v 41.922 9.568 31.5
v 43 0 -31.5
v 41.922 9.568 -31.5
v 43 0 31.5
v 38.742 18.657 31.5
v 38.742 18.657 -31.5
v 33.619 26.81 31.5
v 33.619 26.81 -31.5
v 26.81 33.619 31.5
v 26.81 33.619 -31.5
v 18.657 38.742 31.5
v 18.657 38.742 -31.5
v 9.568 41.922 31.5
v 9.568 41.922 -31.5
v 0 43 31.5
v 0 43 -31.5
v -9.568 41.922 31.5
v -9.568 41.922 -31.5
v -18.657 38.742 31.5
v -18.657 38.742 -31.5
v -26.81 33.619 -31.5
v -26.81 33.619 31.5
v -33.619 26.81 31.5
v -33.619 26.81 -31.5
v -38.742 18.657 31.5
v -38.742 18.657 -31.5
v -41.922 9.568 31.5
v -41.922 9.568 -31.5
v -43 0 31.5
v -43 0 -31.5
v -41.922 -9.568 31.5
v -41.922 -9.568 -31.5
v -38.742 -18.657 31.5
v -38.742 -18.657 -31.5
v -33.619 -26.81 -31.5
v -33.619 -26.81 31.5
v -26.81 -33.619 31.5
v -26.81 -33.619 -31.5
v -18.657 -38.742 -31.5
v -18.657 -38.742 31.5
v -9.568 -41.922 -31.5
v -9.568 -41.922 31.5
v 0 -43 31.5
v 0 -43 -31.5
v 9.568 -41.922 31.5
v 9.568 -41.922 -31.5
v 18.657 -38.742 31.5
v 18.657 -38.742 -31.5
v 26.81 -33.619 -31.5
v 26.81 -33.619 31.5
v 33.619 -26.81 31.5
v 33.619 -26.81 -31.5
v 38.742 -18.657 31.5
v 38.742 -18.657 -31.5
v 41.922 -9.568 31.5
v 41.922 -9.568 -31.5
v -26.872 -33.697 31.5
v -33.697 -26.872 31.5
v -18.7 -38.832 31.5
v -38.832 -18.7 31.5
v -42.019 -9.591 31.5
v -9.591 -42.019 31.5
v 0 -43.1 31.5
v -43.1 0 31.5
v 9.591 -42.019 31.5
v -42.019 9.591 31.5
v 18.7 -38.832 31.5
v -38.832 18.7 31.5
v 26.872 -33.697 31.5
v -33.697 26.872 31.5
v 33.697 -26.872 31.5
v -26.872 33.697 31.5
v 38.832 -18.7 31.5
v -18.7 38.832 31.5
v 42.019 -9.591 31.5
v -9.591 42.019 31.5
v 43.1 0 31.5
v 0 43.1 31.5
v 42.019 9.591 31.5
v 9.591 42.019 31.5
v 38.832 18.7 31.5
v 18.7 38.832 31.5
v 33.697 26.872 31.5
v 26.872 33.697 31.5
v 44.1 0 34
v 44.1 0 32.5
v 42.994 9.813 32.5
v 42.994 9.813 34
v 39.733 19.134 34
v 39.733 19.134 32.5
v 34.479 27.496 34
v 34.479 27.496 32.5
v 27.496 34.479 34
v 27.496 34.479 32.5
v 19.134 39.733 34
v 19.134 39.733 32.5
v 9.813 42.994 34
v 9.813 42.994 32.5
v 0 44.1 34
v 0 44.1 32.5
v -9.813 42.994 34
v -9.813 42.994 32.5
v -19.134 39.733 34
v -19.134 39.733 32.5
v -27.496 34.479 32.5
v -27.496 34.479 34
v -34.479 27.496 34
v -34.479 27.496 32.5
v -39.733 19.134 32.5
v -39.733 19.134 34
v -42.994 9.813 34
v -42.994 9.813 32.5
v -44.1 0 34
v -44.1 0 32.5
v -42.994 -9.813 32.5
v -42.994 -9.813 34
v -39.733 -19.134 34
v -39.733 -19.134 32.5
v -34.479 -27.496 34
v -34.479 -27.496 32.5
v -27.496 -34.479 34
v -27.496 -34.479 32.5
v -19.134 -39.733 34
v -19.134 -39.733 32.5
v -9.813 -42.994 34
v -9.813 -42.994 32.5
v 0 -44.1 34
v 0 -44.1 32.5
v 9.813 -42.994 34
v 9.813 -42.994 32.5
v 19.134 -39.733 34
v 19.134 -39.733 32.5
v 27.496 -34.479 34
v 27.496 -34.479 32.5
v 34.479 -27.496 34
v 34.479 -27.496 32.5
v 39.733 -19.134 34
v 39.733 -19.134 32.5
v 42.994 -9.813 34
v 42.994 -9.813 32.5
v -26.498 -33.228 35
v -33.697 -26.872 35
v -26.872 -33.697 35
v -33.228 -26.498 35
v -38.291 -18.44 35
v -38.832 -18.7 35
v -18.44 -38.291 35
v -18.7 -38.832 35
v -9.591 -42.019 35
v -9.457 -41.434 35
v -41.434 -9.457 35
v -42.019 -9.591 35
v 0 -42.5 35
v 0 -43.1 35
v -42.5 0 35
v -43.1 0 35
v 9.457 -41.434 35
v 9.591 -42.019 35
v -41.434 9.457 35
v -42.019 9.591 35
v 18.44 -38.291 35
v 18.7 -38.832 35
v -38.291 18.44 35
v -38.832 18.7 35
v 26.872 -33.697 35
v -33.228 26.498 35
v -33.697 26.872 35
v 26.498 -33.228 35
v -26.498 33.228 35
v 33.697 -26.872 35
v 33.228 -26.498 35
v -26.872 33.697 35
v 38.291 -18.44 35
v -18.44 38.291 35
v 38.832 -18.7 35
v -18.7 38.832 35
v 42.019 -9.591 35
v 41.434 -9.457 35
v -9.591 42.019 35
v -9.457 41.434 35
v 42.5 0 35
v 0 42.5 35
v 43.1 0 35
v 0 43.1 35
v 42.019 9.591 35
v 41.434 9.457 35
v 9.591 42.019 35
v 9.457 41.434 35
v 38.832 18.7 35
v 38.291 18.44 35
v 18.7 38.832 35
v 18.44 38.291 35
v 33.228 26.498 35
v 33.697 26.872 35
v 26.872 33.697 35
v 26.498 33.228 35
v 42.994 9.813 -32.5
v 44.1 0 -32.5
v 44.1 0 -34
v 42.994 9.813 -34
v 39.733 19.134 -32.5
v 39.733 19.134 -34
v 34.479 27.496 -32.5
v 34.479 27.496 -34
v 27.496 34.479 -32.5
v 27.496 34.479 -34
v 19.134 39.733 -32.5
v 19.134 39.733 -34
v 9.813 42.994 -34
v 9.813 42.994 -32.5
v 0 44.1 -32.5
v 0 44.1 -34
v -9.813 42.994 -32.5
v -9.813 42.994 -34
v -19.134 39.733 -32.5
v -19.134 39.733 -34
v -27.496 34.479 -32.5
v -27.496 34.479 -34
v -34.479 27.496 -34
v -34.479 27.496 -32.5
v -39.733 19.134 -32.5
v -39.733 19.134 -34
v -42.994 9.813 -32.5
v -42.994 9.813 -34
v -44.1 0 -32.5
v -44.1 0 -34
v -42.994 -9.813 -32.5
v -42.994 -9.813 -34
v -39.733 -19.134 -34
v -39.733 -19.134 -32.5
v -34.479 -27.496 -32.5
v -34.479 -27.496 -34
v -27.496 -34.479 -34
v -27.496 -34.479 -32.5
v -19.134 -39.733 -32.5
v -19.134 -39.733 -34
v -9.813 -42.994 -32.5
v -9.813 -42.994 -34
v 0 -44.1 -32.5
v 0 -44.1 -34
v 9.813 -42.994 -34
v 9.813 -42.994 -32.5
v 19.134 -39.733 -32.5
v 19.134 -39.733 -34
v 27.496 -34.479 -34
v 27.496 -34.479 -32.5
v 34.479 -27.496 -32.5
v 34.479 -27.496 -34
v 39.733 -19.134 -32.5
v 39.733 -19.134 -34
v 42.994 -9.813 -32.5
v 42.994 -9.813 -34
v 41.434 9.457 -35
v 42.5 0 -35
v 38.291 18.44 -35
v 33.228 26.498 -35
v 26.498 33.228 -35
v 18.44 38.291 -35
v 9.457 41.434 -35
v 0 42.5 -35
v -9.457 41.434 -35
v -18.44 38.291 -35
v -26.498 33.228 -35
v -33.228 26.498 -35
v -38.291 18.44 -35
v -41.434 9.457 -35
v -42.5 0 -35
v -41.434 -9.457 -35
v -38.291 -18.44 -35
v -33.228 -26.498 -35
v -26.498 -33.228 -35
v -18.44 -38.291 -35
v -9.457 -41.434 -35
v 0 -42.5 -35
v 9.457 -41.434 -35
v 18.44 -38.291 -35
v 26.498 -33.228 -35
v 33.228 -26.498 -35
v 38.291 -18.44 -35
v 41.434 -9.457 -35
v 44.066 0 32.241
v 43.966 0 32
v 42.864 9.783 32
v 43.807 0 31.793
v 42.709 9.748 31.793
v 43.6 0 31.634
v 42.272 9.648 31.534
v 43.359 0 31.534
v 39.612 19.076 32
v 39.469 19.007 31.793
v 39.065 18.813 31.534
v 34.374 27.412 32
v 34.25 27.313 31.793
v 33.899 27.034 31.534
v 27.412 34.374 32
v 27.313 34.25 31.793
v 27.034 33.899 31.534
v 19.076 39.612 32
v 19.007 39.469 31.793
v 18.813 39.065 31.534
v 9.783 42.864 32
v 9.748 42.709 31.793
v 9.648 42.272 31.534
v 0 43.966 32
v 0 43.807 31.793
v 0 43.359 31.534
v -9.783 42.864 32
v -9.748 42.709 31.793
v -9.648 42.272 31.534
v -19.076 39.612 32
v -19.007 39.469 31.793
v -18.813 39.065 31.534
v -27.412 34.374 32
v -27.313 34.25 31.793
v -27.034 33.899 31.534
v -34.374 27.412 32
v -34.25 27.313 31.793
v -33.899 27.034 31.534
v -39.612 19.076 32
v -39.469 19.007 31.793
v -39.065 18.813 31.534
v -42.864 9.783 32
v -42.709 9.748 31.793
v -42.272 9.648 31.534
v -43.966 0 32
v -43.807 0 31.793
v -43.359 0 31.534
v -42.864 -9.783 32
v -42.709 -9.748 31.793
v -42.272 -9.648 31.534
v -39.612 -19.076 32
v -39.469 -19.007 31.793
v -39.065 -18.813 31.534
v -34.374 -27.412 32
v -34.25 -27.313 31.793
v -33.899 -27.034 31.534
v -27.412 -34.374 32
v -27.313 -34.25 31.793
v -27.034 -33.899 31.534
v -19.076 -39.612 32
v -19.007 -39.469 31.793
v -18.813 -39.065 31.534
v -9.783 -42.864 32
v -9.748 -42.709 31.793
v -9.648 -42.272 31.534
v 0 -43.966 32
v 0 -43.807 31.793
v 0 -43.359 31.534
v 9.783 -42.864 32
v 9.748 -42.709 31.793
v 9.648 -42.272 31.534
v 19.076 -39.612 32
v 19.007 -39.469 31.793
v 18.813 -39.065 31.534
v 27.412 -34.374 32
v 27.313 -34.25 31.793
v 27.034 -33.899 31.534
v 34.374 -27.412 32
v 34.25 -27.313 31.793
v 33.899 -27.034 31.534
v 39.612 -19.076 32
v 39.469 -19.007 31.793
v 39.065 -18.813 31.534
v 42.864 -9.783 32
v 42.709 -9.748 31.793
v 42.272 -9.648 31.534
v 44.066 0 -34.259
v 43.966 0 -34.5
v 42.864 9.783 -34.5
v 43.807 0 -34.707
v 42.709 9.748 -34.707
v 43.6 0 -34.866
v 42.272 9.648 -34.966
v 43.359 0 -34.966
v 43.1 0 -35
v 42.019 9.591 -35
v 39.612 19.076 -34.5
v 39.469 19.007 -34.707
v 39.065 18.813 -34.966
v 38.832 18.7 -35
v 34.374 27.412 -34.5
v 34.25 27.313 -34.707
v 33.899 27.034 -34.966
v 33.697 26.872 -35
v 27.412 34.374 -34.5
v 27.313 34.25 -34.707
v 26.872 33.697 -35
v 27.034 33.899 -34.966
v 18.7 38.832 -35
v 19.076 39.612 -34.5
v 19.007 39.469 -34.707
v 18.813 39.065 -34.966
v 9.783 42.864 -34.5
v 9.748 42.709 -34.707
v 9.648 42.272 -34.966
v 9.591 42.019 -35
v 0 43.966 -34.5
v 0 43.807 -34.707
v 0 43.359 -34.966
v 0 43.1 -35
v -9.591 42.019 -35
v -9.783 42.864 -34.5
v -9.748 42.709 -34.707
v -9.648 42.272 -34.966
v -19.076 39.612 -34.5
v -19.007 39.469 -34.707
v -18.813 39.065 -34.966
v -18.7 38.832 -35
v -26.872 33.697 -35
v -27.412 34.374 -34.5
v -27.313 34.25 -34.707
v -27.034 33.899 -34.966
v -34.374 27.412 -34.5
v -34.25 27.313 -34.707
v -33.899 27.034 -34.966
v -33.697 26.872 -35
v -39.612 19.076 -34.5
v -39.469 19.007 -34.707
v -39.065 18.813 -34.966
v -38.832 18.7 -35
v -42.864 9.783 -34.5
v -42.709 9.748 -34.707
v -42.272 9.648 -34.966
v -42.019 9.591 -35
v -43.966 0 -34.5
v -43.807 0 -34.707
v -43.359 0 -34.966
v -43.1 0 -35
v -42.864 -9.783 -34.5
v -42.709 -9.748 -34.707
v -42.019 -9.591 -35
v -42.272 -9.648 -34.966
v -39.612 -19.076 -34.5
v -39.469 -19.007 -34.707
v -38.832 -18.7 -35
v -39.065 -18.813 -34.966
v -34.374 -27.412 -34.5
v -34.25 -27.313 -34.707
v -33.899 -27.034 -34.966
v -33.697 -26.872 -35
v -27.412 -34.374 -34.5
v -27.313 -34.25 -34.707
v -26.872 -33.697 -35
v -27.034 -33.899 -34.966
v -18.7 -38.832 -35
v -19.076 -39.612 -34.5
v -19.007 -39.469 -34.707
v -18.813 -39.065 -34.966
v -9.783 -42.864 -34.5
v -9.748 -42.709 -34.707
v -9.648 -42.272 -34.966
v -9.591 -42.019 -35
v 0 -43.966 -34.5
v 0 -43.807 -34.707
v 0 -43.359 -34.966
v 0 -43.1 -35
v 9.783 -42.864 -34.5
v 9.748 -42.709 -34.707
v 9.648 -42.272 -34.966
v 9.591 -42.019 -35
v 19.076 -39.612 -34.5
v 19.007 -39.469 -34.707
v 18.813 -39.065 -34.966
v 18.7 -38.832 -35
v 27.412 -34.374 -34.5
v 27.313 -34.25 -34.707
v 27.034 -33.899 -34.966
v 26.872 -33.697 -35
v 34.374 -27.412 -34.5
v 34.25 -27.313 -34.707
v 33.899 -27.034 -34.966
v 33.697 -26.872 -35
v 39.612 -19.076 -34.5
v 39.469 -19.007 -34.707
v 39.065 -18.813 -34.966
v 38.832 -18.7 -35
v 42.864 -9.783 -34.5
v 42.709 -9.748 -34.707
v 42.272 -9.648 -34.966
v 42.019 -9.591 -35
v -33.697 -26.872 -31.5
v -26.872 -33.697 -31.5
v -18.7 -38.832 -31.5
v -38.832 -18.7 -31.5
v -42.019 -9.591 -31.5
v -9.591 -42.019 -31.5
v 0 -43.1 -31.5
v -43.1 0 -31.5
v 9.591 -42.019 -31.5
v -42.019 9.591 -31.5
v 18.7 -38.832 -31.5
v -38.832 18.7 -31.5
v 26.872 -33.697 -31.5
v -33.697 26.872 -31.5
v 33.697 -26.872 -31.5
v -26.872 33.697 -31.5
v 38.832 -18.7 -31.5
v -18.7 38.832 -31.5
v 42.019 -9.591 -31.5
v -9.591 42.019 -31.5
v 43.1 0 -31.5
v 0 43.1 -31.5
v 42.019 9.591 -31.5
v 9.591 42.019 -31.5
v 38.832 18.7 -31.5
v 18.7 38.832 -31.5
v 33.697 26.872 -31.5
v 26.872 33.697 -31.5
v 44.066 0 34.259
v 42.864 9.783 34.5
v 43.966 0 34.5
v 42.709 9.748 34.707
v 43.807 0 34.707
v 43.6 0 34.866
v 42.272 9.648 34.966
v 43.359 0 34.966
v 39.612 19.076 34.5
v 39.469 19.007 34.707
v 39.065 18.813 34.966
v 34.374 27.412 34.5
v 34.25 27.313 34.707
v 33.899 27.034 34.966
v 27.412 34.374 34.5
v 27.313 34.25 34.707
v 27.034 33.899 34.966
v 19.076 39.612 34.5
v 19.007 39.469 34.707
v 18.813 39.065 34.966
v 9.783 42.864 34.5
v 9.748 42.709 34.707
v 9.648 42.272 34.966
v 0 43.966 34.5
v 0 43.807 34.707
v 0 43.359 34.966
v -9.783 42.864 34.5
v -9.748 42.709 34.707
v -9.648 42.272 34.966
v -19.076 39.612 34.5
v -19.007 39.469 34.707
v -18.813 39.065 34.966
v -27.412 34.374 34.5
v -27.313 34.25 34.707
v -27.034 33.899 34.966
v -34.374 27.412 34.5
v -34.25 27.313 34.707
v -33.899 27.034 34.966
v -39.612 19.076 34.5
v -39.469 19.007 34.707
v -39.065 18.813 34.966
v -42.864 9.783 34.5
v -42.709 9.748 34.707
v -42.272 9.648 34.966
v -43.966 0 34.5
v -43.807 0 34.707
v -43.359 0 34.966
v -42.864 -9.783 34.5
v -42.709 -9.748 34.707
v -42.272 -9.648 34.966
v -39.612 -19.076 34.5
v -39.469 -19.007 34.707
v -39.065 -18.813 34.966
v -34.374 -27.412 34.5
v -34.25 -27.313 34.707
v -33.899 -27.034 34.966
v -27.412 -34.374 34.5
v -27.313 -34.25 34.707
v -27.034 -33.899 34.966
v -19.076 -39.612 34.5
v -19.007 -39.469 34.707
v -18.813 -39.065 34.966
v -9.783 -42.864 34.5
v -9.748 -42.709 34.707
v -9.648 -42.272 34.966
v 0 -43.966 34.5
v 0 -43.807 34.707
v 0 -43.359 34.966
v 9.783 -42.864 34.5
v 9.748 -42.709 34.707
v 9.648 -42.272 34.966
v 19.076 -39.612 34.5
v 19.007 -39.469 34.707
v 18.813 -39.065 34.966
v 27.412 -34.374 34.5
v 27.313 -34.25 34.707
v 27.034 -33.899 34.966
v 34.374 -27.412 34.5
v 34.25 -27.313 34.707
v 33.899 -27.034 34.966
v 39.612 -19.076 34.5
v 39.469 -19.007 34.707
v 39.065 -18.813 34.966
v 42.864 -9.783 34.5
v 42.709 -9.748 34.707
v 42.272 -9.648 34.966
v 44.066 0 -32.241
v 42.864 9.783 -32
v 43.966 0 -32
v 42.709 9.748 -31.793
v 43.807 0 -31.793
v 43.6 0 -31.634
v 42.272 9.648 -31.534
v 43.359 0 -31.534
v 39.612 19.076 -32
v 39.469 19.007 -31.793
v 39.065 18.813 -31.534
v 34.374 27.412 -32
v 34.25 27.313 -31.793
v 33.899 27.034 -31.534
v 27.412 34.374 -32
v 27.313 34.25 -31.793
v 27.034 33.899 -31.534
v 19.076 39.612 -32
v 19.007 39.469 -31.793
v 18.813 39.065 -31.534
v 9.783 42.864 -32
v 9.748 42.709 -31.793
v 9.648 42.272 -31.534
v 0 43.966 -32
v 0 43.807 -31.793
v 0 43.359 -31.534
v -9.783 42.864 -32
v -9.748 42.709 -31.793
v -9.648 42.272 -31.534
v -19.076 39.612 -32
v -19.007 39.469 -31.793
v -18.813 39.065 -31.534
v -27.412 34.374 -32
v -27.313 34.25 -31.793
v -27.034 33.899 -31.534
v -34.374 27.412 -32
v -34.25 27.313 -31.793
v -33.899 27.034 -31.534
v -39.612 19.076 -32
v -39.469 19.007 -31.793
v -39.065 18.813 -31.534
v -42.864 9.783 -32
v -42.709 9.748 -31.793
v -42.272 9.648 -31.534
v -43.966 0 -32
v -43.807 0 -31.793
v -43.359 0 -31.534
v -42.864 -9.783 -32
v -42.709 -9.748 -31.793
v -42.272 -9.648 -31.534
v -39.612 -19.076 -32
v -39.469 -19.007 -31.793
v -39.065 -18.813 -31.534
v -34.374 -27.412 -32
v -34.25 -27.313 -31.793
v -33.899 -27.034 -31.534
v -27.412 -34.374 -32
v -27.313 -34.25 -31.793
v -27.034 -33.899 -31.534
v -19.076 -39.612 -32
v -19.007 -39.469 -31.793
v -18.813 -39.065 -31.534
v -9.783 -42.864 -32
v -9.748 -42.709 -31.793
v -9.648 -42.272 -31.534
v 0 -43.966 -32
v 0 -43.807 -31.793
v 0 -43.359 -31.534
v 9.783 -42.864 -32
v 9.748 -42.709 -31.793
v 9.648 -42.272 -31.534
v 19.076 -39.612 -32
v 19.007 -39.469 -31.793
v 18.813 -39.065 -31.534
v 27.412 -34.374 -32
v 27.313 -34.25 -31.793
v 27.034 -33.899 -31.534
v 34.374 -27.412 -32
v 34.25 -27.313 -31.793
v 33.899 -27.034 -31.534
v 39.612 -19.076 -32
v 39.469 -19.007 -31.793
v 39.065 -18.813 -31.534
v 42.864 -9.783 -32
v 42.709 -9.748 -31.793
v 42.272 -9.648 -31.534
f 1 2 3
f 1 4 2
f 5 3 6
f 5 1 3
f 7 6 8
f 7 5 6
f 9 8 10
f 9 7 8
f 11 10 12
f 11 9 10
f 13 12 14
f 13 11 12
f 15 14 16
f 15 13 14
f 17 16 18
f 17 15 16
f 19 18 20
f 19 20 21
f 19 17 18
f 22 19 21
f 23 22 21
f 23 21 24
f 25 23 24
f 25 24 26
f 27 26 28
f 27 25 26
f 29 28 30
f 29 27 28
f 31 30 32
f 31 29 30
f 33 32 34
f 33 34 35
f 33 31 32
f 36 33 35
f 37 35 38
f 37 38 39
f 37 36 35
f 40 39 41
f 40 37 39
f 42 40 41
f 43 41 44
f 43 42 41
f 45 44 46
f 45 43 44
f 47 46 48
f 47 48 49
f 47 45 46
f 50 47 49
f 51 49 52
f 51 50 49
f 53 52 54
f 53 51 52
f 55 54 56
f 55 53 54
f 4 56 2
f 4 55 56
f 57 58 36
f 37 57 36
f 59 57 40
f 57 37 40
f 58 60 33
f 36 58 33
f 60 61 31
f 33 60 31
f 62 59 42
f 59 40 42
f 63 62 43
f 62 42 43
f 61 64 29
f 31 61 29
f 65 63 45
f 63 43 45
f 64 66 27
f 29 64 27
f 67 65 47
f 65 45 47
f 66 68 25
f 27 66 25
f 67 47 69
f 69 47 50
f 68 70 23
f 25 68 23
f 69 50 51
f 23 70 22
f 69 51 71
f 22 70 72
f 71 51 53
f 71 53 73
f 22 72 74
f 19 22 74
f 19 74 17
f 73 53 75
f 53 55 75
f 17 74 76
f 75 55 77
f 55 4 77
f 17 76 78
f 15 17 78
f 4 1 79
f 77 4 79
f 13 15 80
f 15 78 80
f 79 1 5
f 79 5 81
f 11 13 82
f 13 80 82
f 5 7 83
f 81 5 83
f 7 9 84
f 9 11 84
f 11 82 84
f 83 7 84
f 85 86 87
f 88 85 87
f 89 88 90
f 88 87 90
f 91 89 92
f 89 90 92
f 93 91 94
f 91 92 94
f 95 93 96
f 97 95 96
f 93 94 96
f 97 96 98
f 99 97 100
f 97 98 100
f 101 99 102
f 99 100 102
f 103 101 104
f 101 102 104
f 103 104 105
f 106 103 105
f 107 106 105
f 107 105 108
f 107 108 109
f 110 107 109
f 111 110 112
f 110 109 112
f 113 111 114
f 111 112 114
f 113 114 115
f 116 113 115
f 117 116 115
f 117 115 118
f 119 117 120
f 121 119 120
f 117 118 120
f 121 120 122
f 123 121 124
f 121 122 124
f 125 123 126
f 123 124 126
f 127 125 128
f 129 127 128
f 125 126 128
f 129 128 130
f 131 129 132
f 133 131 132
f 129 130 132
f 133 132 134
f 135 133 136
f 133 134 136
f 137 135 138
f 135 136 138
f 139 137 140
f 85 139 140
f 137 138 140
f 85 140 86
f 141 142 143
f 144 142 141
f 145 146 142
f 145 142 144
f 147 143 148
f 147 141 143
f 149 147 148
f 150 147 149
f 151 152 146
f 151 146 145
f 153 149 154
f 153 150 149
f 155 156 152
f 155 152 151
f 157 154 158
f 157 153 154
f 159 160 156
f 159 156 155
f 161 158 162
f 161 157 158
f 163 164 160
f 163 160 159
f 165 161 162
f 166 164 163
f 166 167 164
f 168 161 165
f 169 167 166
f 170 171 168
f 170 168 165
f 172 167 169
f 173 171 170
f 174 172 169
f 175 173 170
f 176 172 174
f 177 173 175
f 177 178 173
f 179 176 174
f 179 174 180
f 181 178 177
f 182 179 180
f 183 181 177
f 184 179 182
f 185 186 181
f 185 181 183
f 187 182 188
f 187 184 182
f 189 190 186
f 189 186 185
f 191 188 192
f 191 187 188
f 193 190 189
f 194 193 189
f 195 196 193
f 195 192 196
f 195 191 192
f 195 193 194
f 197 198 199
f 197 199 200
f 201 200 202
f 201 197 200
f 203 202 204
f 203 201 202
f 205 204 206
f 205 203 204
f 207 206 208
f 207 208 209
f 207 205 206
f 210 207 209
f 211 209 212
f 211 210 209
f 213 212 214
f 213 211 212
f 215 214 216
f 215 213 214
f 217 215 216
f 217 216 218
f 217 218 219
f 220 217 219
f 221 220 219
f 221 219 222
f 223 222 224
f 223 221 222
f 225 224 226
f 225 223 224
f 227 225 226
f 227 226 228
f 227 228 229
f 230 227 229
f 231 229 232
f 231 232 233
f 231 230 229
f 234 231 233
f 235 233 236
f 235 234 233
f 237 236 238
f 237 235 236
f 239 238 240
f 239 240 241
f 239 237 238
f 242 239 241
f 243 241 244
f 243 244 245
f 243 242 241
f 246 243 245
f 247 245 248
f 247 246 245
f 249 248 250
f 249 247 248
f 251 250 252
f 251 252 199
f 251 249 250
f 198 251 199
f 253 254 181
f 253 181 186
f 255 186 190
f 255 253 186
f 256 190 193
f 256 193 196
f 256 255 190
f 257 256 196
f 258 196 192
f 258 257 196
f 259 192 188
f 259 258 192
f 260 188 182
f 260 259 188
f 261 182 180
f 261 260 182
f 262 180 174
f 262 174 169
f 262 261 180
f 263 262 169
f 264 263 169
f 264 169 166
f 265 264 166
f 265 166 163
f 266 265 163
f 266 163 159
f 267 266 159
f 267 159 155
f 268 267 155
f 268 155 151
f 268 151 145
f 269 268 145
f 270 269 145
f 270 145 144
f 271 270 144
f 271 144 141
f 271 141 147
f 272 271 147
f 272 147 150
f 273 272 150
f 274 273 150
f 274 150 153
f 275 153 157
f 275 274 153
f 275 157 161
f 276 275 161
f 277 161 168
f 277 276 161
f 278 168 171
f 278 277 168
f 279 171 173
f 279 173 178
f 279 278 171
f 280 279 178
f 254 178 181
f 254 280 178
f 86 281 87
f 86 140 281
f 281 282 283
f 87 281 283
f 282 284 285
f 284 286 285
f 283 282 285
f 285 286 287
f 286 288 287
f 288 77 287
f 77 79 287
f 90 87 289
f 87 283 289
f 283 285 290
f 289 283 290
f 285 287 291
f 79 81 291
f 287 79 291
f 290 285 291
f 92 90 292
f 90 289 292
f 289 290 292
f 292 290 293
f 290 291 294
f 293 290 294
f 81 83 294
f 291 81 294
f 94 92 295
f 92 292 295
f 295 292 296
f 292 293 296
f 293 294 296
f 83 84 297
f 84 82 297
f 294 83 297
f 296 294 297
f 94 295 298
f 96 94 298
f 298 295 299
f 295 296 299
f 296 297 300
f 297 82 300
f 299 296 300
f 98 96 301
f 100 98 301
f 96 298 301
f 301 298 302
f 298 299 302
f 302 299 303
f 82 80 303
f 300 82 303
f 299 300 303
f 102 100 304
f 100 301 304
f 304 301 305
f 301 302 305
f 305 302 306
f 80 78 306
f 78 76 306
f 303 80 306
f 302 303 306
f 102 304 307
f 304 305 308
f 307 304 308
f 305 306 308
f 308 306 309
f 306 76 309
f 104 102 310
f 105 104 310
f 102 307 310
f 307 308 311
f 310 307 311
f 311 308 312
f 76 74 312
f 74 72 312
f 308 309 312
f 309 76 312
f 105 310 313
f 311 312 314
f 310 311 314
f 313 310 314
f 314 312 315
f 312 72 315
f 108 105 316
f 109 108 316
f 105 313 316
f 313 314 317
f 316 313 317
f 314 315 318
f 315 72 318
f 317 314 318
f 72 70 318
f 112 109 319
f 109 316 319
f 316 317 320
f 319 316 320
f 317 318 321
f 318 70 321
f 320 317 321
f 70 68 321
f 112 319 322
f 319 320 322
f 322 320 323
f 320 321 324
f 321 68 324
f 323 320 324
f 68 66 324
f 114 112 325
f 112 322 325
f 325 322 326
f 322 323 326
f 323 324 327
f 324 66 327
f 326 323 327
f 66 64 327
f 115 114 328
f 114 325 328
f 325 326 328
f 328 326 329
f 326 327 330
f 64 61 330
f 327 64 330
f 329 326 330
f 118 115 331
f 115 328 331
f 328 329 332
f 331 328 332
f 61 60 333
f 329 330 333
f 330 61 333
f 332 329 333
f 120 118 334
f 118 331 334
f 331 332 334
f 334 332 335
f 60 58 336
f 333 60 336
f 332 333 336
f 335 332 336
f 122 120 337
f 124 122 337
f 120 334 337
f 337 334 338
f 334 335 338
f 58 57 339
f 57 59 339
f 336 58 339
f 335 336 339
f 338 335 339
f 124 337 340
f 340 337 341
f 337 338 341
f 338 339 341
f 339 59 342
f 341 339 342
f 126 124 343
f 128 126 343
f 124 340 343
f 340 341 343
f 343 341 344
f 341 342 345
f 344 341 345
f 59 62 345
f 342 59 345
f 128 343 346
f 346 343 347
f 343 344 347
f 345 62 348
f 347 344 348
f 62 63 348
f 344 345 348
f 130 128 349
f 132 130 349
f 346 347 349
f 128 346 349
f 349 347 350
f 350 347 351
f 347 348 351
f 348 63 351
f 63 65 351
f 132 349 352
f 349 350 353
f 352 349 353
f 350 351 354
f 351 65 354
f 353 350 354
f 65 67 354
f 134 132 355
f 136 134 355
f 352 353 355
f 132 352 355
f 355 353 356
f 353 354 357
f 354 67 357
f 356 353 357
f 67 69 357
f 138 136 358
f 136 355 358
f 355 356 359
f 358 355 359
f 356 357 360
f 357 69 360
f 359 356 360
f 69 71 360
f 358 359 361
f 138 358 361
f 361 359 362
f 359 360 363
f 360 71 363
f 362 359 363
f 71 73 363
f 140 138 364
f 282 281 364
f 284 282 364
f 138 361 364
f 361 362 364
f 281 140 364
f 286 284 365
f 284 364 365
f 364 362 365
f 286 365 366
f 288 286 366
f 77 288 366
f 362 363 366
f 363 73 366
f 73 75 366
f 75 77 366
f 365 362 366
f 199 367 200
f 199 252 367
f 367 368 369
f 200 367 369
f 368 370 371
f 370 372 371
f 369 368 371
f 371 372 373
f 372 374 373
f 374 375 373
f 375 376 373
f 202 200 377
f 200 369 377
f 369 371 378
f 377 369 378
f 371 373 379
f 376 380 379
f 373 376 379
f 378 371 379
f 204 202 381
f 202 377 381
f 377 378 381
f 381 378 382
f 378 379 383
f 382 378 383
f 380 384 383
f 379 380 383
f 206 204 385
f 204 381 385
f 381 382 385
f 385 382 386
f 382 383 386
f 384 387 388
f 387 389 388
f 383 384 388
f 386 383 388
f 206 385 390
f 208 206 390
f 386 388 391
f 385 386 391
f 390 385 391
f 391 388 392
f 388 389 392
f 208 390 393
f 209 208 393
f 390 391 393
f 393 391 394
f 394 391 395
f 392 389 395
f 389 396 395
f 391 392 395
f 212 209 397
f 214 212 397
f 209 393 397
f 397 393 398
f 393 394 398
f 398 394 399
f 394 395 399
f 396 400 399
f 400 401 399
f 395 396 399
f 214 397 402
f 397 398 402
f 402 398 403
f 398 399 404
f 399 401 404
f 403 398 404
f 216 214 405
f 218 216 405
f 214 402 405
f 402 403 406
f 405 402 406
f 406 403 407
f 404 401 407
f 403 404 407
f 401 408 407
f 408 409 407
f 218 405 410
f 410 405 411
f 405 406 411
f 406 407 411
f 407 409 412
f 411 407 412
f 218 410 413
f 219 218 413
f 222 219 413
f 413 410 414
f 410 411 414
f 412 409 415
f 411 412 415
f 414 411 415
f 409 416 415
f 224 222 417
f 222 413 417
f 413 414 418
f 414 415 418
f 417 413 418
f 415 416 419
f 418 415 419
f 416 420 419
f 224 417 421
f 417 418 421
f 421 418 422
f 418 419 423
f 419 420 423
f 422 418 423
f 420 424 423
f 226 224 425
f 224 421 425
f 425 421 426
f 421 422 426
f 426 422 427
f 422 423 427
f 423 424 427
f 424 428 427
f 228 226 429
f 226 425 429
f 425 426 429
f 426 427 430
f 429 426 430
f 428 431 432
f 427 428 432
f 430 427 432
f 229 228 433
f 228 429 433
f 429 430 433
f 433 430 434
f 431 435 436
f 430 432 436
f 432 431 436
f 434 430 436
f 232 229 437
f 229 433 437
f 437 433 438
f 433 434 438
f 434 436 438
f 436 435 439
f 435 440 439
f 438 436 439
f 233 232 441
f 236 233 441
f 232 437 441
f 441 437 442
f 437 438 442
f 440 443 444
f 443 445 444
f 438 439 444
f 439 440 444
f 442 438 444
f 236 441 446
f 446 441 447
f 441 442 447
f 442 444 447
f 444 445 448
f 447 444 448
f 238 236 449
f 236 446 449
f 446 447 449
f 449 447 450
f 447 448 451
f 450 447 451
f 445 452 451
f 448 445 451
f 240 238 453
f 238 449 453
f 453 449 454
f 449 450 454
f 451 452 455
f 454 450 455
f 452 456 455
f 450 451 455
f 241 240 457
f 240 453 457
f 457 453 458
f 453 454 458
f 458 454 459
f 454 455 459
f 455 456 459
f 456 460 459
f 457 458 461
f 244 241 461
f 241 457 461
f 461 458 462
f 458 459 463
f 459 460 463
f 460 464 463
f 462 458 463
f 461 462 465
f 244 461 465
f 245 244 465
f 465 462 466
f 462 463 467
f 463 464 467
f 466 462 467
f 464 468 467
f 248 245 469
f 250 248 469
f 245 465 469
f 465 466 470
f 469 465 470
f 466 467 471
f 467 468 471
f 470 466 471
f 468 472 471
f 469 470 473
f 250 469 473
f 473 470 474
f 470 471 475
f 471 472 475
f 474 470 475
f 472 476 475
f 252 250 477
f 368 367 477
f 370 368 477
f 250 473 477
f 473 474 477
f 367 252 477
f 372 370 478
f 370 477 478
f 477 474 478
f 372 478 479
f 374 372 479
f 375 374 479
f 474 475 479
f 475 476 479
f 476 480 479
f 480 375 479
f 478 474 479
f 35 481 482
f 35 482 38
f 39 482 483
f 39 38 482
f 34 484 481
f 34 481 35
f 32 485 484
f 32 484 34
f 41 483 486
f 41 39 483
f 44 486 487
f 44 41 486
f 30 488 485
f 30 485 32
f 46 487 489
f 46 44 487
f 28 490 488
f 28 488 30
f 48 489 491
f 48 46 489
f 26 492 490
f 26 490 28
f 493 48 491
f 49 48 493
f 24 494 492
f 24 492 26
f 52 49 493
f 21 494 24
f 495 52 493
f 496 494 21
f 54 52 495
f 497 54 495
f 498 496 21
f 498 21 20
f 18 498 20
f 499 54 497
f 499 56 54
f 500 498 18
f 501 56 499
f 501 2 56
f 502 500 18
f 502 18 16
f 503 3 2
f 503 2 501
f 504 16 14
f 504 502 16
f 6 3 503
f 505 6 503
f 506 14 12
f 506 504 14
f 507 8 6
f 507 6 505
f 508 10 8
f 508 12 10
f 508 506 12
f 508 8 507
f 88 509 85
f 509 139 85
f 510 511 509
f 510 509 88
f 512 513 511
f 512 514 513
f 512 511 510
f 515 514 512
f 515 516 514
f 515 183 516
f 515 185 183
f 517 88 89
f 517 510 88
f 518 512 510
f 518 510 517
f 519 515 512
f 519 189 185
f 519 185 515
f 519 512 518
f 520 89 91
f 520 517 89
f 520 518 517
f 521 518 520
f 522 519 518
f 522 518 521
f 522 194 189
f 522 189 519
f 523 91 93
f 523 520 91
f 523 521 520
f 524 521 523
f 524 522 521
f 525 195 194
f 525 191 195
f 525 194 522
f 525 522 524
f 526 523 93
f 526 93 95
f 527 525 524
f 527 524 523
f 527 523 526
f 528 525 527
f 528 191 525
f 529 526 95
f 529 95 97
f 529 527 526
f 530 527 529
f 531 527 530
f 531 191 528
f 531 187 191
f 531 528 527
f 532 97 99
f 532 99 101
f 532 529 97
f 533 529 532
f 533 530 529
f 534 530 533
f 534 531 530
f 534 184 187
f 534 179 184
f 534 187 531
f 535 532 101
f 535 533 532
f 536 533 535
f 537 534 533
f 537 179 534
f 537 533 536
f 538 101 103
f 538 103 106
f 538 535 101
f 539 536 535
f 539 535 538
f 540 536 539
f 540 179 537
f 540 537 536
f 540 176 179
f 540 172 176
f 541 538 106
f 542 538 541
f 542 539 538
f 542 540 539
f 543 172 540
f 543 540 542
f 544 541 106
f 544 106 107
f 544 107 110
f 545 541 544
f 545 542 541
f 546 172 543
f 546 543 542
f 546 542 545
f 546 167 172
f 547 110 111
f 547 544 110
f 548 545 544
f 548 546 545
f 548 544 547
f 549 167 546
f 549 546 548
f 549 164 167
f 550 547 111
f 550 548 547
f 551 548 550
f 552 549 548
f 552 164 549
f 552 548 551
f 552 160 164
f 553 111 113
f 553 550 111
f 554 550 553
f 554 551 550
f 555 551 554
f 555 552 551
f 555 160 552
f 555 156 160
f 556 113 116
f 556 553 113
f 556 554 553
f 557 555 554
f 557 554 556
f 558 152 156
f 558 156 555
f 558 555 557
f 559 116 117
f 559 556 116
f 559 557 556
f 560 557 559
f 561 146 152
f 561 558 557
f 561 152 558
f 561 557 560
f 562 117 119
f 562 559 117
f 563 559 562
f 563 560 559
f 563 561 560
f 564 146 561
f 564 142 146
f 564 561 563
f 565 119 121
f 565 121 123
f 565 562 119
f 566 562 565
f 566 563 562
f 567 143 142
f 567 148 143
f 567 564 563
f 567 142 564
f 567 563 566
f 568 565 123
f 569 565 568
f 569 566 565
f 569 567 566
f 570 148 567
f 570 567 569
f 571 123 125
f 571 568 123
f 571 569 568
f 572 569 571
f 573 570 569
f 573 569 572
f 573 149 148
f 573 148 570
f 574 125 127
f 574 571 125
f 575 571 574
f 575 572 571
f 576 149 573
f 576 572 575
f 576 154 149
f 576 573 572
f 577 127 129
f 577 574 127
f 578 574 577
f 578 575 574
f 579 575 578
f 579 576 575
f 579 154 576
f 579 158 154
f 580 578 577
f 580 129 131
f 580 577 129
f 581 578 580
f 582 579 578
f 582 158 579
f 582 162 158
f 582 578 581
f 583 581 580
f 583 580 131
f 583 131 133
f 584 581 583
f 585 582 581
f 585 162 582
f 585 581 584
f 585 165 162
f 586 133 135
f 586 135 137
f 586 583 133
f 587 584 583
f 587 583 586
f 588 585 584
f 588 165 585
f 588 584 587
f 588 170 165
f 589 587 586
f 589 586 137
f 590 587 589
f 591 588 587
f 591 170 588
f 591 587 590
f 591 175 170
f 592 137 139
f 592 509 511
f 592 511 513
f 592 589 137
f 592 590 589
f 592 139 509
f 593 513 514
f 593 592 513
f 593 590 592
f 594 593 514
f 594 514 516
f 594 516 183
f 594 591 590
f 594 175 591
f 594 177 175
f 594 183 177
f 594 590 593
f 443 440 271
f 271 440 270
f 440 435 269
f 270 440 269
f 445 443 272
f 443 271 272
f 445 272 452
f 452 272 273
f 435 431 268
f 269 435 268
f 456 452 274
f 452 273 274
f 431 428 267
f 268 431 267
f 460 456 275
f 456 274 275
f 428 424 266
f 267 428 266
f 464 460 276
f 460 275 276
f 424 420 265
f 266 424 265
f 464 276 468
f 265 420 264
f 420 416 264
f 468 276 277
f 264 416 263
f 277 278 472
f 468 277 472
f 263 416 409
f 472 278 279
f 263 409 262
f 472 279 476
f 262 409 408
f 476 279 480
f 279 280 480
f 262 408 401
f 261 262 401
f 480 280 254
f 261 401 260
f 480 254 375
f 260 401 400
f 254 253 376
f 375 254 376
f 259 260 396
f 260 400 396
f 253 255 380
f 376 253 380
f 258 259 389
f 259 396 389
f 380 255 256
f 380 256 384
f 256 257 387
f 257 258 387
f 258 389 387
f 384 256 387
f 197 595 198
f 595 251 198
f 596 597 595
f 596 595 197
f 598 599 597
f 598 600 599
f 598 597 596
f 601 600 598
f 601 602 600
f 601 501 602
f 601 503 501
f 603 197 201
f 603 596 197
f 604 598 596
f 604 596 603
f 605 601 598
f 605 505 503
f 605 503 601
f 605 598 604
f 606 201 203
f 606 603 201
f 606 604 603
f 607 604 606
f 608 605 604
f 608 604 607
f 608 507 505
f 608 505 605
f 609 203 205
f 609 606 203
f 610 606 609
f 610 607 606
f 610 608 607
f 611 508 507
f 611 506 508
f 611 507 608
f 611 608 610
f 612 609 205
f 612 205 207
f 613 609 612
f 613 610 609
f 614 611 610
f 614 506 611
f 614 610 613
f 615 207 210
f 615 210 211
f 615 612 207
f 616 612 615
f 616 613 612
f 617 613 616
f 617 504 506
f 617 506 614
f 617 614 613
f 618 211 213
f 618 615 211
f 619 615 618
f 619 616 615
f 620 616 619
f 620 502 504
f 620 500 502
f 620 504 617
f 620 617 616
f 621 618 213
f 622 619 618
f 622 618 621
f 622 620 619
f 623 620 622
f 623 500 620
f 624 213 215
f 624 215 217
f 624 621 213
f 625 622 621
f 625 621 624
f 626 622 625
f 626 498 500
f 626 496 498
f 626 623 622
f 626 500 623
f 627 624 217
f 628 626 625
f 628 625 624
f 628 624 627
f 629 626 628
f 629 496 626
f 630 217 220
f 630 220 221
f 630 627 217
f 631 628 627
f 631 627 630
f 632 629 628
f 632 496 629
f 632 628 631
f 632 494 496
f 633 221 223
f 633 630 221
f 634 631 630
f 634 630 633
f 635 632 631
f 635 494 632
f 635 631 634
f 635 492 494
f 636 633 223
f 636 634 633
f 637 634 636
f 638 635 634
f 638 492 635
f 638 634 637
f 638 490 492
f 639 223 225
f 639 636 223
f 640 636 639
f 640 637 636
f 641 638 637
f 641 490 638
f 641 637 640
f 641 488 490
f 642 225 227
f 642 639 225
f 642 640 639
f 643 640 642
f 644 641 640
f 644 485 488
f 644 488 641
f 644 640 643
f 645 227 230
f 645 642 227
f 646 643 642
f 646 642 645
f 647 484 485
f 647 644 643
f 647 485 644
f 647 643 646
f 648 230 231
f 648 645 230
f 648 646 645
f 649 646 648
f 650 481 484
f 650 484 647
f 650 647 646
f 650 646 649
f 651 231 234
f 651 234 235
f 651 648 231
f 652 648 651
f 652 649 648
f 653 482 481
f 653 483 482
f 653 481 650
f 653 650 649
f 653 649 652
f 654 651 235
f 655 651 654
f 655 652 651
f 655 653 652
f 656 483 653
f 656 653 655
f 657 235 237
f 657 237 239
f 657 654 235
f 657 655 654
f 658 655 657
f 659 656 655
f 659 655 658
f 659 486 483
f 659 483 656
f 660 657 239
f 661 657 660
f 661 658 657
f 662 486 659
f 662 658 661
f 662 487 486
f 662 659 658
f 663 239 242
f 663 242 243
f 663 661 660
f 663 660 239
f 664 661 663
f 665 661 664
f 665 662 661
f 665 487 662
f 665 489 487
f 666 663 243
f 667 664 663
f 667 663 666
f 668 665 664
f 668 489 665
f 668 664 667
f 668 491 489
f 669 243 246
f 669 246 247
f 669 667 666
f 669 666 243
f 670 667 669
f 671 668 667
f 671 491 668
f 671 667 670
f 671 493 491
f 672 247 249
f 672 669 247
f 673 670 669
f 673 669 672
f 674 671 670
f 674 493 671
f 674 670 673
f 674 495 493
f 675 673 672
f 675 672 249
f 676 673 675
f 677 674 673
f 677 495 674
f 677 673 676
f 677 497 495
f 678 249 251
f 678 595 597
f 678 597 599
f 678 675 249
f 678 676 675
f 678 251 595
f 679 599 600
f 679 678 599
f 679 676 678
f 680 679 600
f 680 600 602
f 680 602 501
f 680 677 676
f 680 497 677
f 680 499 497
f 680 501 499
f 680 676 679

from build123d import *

# Parameters (mm, degrees)
SKETCH1_R            = 43
SKETCH1_R_2          = 42.5
EXTRUDE_THIN1_DEPTH  = 35
EXTRUDE_THIN2_START  = -3.5
SKETCH2_R            = 44.1
SKETCH2_R_2          = 42.5
EXTRUDE_THIN2_DEPTH  = 3.5
FILLET1_R            = 1
FILLET1_OF_MIRROR1_R = 1


with BuildPart() as part:
    # Sketch1 → Extrude-Thin1 (new, symmetric)
    with BuildSketch(Plane.XY):
        Circle(SKETCH1_R)
        Circle(SKETCH1_R_2, mode=Mode.SUBTRACT)
    extrude(amount=EXTRUDE_THIN1_DEPTH, both=True)

    # Sketch2 → Extrude-Thin2 (add)
    with BuildSketch(Plane.XY.offset(35).offset(EXTRUDE_THIN2_START)):
        Circle(SKETCH2_R)
        Circle(SKETCH2_R_2, mode=Mode.SUBTRACT)
    extrude_thin2 = extrude(amount=EXTRUDE_THIN2_DEPTH)

    # Fillet1
    fillet1_edges = [part.edges().sort_by_distance(p)[0] for p in [
        (-44.1, 0, 35),
        (-44.1, 0, 31.5),
    ]]
    fillet(fillet1_edges, radius=FILLET1_R)

    # Mirror1: Extrude-Thin2 across plane
    add(extrude_thin2.mirror(Plane.XY))

    # Fillet1 of Mirror1
    fillet1_of_mirror1_edges = [part.edges().sort_by_distance(p)[0] for p in [
        (-44.1, 0, -35),
        (-44.1, 0, -31.5),
    ]]
    fillet(fillet1_of_mirror1_edges, radius=FILLET1_OF_MIRROR1_R)


solid = part.part
